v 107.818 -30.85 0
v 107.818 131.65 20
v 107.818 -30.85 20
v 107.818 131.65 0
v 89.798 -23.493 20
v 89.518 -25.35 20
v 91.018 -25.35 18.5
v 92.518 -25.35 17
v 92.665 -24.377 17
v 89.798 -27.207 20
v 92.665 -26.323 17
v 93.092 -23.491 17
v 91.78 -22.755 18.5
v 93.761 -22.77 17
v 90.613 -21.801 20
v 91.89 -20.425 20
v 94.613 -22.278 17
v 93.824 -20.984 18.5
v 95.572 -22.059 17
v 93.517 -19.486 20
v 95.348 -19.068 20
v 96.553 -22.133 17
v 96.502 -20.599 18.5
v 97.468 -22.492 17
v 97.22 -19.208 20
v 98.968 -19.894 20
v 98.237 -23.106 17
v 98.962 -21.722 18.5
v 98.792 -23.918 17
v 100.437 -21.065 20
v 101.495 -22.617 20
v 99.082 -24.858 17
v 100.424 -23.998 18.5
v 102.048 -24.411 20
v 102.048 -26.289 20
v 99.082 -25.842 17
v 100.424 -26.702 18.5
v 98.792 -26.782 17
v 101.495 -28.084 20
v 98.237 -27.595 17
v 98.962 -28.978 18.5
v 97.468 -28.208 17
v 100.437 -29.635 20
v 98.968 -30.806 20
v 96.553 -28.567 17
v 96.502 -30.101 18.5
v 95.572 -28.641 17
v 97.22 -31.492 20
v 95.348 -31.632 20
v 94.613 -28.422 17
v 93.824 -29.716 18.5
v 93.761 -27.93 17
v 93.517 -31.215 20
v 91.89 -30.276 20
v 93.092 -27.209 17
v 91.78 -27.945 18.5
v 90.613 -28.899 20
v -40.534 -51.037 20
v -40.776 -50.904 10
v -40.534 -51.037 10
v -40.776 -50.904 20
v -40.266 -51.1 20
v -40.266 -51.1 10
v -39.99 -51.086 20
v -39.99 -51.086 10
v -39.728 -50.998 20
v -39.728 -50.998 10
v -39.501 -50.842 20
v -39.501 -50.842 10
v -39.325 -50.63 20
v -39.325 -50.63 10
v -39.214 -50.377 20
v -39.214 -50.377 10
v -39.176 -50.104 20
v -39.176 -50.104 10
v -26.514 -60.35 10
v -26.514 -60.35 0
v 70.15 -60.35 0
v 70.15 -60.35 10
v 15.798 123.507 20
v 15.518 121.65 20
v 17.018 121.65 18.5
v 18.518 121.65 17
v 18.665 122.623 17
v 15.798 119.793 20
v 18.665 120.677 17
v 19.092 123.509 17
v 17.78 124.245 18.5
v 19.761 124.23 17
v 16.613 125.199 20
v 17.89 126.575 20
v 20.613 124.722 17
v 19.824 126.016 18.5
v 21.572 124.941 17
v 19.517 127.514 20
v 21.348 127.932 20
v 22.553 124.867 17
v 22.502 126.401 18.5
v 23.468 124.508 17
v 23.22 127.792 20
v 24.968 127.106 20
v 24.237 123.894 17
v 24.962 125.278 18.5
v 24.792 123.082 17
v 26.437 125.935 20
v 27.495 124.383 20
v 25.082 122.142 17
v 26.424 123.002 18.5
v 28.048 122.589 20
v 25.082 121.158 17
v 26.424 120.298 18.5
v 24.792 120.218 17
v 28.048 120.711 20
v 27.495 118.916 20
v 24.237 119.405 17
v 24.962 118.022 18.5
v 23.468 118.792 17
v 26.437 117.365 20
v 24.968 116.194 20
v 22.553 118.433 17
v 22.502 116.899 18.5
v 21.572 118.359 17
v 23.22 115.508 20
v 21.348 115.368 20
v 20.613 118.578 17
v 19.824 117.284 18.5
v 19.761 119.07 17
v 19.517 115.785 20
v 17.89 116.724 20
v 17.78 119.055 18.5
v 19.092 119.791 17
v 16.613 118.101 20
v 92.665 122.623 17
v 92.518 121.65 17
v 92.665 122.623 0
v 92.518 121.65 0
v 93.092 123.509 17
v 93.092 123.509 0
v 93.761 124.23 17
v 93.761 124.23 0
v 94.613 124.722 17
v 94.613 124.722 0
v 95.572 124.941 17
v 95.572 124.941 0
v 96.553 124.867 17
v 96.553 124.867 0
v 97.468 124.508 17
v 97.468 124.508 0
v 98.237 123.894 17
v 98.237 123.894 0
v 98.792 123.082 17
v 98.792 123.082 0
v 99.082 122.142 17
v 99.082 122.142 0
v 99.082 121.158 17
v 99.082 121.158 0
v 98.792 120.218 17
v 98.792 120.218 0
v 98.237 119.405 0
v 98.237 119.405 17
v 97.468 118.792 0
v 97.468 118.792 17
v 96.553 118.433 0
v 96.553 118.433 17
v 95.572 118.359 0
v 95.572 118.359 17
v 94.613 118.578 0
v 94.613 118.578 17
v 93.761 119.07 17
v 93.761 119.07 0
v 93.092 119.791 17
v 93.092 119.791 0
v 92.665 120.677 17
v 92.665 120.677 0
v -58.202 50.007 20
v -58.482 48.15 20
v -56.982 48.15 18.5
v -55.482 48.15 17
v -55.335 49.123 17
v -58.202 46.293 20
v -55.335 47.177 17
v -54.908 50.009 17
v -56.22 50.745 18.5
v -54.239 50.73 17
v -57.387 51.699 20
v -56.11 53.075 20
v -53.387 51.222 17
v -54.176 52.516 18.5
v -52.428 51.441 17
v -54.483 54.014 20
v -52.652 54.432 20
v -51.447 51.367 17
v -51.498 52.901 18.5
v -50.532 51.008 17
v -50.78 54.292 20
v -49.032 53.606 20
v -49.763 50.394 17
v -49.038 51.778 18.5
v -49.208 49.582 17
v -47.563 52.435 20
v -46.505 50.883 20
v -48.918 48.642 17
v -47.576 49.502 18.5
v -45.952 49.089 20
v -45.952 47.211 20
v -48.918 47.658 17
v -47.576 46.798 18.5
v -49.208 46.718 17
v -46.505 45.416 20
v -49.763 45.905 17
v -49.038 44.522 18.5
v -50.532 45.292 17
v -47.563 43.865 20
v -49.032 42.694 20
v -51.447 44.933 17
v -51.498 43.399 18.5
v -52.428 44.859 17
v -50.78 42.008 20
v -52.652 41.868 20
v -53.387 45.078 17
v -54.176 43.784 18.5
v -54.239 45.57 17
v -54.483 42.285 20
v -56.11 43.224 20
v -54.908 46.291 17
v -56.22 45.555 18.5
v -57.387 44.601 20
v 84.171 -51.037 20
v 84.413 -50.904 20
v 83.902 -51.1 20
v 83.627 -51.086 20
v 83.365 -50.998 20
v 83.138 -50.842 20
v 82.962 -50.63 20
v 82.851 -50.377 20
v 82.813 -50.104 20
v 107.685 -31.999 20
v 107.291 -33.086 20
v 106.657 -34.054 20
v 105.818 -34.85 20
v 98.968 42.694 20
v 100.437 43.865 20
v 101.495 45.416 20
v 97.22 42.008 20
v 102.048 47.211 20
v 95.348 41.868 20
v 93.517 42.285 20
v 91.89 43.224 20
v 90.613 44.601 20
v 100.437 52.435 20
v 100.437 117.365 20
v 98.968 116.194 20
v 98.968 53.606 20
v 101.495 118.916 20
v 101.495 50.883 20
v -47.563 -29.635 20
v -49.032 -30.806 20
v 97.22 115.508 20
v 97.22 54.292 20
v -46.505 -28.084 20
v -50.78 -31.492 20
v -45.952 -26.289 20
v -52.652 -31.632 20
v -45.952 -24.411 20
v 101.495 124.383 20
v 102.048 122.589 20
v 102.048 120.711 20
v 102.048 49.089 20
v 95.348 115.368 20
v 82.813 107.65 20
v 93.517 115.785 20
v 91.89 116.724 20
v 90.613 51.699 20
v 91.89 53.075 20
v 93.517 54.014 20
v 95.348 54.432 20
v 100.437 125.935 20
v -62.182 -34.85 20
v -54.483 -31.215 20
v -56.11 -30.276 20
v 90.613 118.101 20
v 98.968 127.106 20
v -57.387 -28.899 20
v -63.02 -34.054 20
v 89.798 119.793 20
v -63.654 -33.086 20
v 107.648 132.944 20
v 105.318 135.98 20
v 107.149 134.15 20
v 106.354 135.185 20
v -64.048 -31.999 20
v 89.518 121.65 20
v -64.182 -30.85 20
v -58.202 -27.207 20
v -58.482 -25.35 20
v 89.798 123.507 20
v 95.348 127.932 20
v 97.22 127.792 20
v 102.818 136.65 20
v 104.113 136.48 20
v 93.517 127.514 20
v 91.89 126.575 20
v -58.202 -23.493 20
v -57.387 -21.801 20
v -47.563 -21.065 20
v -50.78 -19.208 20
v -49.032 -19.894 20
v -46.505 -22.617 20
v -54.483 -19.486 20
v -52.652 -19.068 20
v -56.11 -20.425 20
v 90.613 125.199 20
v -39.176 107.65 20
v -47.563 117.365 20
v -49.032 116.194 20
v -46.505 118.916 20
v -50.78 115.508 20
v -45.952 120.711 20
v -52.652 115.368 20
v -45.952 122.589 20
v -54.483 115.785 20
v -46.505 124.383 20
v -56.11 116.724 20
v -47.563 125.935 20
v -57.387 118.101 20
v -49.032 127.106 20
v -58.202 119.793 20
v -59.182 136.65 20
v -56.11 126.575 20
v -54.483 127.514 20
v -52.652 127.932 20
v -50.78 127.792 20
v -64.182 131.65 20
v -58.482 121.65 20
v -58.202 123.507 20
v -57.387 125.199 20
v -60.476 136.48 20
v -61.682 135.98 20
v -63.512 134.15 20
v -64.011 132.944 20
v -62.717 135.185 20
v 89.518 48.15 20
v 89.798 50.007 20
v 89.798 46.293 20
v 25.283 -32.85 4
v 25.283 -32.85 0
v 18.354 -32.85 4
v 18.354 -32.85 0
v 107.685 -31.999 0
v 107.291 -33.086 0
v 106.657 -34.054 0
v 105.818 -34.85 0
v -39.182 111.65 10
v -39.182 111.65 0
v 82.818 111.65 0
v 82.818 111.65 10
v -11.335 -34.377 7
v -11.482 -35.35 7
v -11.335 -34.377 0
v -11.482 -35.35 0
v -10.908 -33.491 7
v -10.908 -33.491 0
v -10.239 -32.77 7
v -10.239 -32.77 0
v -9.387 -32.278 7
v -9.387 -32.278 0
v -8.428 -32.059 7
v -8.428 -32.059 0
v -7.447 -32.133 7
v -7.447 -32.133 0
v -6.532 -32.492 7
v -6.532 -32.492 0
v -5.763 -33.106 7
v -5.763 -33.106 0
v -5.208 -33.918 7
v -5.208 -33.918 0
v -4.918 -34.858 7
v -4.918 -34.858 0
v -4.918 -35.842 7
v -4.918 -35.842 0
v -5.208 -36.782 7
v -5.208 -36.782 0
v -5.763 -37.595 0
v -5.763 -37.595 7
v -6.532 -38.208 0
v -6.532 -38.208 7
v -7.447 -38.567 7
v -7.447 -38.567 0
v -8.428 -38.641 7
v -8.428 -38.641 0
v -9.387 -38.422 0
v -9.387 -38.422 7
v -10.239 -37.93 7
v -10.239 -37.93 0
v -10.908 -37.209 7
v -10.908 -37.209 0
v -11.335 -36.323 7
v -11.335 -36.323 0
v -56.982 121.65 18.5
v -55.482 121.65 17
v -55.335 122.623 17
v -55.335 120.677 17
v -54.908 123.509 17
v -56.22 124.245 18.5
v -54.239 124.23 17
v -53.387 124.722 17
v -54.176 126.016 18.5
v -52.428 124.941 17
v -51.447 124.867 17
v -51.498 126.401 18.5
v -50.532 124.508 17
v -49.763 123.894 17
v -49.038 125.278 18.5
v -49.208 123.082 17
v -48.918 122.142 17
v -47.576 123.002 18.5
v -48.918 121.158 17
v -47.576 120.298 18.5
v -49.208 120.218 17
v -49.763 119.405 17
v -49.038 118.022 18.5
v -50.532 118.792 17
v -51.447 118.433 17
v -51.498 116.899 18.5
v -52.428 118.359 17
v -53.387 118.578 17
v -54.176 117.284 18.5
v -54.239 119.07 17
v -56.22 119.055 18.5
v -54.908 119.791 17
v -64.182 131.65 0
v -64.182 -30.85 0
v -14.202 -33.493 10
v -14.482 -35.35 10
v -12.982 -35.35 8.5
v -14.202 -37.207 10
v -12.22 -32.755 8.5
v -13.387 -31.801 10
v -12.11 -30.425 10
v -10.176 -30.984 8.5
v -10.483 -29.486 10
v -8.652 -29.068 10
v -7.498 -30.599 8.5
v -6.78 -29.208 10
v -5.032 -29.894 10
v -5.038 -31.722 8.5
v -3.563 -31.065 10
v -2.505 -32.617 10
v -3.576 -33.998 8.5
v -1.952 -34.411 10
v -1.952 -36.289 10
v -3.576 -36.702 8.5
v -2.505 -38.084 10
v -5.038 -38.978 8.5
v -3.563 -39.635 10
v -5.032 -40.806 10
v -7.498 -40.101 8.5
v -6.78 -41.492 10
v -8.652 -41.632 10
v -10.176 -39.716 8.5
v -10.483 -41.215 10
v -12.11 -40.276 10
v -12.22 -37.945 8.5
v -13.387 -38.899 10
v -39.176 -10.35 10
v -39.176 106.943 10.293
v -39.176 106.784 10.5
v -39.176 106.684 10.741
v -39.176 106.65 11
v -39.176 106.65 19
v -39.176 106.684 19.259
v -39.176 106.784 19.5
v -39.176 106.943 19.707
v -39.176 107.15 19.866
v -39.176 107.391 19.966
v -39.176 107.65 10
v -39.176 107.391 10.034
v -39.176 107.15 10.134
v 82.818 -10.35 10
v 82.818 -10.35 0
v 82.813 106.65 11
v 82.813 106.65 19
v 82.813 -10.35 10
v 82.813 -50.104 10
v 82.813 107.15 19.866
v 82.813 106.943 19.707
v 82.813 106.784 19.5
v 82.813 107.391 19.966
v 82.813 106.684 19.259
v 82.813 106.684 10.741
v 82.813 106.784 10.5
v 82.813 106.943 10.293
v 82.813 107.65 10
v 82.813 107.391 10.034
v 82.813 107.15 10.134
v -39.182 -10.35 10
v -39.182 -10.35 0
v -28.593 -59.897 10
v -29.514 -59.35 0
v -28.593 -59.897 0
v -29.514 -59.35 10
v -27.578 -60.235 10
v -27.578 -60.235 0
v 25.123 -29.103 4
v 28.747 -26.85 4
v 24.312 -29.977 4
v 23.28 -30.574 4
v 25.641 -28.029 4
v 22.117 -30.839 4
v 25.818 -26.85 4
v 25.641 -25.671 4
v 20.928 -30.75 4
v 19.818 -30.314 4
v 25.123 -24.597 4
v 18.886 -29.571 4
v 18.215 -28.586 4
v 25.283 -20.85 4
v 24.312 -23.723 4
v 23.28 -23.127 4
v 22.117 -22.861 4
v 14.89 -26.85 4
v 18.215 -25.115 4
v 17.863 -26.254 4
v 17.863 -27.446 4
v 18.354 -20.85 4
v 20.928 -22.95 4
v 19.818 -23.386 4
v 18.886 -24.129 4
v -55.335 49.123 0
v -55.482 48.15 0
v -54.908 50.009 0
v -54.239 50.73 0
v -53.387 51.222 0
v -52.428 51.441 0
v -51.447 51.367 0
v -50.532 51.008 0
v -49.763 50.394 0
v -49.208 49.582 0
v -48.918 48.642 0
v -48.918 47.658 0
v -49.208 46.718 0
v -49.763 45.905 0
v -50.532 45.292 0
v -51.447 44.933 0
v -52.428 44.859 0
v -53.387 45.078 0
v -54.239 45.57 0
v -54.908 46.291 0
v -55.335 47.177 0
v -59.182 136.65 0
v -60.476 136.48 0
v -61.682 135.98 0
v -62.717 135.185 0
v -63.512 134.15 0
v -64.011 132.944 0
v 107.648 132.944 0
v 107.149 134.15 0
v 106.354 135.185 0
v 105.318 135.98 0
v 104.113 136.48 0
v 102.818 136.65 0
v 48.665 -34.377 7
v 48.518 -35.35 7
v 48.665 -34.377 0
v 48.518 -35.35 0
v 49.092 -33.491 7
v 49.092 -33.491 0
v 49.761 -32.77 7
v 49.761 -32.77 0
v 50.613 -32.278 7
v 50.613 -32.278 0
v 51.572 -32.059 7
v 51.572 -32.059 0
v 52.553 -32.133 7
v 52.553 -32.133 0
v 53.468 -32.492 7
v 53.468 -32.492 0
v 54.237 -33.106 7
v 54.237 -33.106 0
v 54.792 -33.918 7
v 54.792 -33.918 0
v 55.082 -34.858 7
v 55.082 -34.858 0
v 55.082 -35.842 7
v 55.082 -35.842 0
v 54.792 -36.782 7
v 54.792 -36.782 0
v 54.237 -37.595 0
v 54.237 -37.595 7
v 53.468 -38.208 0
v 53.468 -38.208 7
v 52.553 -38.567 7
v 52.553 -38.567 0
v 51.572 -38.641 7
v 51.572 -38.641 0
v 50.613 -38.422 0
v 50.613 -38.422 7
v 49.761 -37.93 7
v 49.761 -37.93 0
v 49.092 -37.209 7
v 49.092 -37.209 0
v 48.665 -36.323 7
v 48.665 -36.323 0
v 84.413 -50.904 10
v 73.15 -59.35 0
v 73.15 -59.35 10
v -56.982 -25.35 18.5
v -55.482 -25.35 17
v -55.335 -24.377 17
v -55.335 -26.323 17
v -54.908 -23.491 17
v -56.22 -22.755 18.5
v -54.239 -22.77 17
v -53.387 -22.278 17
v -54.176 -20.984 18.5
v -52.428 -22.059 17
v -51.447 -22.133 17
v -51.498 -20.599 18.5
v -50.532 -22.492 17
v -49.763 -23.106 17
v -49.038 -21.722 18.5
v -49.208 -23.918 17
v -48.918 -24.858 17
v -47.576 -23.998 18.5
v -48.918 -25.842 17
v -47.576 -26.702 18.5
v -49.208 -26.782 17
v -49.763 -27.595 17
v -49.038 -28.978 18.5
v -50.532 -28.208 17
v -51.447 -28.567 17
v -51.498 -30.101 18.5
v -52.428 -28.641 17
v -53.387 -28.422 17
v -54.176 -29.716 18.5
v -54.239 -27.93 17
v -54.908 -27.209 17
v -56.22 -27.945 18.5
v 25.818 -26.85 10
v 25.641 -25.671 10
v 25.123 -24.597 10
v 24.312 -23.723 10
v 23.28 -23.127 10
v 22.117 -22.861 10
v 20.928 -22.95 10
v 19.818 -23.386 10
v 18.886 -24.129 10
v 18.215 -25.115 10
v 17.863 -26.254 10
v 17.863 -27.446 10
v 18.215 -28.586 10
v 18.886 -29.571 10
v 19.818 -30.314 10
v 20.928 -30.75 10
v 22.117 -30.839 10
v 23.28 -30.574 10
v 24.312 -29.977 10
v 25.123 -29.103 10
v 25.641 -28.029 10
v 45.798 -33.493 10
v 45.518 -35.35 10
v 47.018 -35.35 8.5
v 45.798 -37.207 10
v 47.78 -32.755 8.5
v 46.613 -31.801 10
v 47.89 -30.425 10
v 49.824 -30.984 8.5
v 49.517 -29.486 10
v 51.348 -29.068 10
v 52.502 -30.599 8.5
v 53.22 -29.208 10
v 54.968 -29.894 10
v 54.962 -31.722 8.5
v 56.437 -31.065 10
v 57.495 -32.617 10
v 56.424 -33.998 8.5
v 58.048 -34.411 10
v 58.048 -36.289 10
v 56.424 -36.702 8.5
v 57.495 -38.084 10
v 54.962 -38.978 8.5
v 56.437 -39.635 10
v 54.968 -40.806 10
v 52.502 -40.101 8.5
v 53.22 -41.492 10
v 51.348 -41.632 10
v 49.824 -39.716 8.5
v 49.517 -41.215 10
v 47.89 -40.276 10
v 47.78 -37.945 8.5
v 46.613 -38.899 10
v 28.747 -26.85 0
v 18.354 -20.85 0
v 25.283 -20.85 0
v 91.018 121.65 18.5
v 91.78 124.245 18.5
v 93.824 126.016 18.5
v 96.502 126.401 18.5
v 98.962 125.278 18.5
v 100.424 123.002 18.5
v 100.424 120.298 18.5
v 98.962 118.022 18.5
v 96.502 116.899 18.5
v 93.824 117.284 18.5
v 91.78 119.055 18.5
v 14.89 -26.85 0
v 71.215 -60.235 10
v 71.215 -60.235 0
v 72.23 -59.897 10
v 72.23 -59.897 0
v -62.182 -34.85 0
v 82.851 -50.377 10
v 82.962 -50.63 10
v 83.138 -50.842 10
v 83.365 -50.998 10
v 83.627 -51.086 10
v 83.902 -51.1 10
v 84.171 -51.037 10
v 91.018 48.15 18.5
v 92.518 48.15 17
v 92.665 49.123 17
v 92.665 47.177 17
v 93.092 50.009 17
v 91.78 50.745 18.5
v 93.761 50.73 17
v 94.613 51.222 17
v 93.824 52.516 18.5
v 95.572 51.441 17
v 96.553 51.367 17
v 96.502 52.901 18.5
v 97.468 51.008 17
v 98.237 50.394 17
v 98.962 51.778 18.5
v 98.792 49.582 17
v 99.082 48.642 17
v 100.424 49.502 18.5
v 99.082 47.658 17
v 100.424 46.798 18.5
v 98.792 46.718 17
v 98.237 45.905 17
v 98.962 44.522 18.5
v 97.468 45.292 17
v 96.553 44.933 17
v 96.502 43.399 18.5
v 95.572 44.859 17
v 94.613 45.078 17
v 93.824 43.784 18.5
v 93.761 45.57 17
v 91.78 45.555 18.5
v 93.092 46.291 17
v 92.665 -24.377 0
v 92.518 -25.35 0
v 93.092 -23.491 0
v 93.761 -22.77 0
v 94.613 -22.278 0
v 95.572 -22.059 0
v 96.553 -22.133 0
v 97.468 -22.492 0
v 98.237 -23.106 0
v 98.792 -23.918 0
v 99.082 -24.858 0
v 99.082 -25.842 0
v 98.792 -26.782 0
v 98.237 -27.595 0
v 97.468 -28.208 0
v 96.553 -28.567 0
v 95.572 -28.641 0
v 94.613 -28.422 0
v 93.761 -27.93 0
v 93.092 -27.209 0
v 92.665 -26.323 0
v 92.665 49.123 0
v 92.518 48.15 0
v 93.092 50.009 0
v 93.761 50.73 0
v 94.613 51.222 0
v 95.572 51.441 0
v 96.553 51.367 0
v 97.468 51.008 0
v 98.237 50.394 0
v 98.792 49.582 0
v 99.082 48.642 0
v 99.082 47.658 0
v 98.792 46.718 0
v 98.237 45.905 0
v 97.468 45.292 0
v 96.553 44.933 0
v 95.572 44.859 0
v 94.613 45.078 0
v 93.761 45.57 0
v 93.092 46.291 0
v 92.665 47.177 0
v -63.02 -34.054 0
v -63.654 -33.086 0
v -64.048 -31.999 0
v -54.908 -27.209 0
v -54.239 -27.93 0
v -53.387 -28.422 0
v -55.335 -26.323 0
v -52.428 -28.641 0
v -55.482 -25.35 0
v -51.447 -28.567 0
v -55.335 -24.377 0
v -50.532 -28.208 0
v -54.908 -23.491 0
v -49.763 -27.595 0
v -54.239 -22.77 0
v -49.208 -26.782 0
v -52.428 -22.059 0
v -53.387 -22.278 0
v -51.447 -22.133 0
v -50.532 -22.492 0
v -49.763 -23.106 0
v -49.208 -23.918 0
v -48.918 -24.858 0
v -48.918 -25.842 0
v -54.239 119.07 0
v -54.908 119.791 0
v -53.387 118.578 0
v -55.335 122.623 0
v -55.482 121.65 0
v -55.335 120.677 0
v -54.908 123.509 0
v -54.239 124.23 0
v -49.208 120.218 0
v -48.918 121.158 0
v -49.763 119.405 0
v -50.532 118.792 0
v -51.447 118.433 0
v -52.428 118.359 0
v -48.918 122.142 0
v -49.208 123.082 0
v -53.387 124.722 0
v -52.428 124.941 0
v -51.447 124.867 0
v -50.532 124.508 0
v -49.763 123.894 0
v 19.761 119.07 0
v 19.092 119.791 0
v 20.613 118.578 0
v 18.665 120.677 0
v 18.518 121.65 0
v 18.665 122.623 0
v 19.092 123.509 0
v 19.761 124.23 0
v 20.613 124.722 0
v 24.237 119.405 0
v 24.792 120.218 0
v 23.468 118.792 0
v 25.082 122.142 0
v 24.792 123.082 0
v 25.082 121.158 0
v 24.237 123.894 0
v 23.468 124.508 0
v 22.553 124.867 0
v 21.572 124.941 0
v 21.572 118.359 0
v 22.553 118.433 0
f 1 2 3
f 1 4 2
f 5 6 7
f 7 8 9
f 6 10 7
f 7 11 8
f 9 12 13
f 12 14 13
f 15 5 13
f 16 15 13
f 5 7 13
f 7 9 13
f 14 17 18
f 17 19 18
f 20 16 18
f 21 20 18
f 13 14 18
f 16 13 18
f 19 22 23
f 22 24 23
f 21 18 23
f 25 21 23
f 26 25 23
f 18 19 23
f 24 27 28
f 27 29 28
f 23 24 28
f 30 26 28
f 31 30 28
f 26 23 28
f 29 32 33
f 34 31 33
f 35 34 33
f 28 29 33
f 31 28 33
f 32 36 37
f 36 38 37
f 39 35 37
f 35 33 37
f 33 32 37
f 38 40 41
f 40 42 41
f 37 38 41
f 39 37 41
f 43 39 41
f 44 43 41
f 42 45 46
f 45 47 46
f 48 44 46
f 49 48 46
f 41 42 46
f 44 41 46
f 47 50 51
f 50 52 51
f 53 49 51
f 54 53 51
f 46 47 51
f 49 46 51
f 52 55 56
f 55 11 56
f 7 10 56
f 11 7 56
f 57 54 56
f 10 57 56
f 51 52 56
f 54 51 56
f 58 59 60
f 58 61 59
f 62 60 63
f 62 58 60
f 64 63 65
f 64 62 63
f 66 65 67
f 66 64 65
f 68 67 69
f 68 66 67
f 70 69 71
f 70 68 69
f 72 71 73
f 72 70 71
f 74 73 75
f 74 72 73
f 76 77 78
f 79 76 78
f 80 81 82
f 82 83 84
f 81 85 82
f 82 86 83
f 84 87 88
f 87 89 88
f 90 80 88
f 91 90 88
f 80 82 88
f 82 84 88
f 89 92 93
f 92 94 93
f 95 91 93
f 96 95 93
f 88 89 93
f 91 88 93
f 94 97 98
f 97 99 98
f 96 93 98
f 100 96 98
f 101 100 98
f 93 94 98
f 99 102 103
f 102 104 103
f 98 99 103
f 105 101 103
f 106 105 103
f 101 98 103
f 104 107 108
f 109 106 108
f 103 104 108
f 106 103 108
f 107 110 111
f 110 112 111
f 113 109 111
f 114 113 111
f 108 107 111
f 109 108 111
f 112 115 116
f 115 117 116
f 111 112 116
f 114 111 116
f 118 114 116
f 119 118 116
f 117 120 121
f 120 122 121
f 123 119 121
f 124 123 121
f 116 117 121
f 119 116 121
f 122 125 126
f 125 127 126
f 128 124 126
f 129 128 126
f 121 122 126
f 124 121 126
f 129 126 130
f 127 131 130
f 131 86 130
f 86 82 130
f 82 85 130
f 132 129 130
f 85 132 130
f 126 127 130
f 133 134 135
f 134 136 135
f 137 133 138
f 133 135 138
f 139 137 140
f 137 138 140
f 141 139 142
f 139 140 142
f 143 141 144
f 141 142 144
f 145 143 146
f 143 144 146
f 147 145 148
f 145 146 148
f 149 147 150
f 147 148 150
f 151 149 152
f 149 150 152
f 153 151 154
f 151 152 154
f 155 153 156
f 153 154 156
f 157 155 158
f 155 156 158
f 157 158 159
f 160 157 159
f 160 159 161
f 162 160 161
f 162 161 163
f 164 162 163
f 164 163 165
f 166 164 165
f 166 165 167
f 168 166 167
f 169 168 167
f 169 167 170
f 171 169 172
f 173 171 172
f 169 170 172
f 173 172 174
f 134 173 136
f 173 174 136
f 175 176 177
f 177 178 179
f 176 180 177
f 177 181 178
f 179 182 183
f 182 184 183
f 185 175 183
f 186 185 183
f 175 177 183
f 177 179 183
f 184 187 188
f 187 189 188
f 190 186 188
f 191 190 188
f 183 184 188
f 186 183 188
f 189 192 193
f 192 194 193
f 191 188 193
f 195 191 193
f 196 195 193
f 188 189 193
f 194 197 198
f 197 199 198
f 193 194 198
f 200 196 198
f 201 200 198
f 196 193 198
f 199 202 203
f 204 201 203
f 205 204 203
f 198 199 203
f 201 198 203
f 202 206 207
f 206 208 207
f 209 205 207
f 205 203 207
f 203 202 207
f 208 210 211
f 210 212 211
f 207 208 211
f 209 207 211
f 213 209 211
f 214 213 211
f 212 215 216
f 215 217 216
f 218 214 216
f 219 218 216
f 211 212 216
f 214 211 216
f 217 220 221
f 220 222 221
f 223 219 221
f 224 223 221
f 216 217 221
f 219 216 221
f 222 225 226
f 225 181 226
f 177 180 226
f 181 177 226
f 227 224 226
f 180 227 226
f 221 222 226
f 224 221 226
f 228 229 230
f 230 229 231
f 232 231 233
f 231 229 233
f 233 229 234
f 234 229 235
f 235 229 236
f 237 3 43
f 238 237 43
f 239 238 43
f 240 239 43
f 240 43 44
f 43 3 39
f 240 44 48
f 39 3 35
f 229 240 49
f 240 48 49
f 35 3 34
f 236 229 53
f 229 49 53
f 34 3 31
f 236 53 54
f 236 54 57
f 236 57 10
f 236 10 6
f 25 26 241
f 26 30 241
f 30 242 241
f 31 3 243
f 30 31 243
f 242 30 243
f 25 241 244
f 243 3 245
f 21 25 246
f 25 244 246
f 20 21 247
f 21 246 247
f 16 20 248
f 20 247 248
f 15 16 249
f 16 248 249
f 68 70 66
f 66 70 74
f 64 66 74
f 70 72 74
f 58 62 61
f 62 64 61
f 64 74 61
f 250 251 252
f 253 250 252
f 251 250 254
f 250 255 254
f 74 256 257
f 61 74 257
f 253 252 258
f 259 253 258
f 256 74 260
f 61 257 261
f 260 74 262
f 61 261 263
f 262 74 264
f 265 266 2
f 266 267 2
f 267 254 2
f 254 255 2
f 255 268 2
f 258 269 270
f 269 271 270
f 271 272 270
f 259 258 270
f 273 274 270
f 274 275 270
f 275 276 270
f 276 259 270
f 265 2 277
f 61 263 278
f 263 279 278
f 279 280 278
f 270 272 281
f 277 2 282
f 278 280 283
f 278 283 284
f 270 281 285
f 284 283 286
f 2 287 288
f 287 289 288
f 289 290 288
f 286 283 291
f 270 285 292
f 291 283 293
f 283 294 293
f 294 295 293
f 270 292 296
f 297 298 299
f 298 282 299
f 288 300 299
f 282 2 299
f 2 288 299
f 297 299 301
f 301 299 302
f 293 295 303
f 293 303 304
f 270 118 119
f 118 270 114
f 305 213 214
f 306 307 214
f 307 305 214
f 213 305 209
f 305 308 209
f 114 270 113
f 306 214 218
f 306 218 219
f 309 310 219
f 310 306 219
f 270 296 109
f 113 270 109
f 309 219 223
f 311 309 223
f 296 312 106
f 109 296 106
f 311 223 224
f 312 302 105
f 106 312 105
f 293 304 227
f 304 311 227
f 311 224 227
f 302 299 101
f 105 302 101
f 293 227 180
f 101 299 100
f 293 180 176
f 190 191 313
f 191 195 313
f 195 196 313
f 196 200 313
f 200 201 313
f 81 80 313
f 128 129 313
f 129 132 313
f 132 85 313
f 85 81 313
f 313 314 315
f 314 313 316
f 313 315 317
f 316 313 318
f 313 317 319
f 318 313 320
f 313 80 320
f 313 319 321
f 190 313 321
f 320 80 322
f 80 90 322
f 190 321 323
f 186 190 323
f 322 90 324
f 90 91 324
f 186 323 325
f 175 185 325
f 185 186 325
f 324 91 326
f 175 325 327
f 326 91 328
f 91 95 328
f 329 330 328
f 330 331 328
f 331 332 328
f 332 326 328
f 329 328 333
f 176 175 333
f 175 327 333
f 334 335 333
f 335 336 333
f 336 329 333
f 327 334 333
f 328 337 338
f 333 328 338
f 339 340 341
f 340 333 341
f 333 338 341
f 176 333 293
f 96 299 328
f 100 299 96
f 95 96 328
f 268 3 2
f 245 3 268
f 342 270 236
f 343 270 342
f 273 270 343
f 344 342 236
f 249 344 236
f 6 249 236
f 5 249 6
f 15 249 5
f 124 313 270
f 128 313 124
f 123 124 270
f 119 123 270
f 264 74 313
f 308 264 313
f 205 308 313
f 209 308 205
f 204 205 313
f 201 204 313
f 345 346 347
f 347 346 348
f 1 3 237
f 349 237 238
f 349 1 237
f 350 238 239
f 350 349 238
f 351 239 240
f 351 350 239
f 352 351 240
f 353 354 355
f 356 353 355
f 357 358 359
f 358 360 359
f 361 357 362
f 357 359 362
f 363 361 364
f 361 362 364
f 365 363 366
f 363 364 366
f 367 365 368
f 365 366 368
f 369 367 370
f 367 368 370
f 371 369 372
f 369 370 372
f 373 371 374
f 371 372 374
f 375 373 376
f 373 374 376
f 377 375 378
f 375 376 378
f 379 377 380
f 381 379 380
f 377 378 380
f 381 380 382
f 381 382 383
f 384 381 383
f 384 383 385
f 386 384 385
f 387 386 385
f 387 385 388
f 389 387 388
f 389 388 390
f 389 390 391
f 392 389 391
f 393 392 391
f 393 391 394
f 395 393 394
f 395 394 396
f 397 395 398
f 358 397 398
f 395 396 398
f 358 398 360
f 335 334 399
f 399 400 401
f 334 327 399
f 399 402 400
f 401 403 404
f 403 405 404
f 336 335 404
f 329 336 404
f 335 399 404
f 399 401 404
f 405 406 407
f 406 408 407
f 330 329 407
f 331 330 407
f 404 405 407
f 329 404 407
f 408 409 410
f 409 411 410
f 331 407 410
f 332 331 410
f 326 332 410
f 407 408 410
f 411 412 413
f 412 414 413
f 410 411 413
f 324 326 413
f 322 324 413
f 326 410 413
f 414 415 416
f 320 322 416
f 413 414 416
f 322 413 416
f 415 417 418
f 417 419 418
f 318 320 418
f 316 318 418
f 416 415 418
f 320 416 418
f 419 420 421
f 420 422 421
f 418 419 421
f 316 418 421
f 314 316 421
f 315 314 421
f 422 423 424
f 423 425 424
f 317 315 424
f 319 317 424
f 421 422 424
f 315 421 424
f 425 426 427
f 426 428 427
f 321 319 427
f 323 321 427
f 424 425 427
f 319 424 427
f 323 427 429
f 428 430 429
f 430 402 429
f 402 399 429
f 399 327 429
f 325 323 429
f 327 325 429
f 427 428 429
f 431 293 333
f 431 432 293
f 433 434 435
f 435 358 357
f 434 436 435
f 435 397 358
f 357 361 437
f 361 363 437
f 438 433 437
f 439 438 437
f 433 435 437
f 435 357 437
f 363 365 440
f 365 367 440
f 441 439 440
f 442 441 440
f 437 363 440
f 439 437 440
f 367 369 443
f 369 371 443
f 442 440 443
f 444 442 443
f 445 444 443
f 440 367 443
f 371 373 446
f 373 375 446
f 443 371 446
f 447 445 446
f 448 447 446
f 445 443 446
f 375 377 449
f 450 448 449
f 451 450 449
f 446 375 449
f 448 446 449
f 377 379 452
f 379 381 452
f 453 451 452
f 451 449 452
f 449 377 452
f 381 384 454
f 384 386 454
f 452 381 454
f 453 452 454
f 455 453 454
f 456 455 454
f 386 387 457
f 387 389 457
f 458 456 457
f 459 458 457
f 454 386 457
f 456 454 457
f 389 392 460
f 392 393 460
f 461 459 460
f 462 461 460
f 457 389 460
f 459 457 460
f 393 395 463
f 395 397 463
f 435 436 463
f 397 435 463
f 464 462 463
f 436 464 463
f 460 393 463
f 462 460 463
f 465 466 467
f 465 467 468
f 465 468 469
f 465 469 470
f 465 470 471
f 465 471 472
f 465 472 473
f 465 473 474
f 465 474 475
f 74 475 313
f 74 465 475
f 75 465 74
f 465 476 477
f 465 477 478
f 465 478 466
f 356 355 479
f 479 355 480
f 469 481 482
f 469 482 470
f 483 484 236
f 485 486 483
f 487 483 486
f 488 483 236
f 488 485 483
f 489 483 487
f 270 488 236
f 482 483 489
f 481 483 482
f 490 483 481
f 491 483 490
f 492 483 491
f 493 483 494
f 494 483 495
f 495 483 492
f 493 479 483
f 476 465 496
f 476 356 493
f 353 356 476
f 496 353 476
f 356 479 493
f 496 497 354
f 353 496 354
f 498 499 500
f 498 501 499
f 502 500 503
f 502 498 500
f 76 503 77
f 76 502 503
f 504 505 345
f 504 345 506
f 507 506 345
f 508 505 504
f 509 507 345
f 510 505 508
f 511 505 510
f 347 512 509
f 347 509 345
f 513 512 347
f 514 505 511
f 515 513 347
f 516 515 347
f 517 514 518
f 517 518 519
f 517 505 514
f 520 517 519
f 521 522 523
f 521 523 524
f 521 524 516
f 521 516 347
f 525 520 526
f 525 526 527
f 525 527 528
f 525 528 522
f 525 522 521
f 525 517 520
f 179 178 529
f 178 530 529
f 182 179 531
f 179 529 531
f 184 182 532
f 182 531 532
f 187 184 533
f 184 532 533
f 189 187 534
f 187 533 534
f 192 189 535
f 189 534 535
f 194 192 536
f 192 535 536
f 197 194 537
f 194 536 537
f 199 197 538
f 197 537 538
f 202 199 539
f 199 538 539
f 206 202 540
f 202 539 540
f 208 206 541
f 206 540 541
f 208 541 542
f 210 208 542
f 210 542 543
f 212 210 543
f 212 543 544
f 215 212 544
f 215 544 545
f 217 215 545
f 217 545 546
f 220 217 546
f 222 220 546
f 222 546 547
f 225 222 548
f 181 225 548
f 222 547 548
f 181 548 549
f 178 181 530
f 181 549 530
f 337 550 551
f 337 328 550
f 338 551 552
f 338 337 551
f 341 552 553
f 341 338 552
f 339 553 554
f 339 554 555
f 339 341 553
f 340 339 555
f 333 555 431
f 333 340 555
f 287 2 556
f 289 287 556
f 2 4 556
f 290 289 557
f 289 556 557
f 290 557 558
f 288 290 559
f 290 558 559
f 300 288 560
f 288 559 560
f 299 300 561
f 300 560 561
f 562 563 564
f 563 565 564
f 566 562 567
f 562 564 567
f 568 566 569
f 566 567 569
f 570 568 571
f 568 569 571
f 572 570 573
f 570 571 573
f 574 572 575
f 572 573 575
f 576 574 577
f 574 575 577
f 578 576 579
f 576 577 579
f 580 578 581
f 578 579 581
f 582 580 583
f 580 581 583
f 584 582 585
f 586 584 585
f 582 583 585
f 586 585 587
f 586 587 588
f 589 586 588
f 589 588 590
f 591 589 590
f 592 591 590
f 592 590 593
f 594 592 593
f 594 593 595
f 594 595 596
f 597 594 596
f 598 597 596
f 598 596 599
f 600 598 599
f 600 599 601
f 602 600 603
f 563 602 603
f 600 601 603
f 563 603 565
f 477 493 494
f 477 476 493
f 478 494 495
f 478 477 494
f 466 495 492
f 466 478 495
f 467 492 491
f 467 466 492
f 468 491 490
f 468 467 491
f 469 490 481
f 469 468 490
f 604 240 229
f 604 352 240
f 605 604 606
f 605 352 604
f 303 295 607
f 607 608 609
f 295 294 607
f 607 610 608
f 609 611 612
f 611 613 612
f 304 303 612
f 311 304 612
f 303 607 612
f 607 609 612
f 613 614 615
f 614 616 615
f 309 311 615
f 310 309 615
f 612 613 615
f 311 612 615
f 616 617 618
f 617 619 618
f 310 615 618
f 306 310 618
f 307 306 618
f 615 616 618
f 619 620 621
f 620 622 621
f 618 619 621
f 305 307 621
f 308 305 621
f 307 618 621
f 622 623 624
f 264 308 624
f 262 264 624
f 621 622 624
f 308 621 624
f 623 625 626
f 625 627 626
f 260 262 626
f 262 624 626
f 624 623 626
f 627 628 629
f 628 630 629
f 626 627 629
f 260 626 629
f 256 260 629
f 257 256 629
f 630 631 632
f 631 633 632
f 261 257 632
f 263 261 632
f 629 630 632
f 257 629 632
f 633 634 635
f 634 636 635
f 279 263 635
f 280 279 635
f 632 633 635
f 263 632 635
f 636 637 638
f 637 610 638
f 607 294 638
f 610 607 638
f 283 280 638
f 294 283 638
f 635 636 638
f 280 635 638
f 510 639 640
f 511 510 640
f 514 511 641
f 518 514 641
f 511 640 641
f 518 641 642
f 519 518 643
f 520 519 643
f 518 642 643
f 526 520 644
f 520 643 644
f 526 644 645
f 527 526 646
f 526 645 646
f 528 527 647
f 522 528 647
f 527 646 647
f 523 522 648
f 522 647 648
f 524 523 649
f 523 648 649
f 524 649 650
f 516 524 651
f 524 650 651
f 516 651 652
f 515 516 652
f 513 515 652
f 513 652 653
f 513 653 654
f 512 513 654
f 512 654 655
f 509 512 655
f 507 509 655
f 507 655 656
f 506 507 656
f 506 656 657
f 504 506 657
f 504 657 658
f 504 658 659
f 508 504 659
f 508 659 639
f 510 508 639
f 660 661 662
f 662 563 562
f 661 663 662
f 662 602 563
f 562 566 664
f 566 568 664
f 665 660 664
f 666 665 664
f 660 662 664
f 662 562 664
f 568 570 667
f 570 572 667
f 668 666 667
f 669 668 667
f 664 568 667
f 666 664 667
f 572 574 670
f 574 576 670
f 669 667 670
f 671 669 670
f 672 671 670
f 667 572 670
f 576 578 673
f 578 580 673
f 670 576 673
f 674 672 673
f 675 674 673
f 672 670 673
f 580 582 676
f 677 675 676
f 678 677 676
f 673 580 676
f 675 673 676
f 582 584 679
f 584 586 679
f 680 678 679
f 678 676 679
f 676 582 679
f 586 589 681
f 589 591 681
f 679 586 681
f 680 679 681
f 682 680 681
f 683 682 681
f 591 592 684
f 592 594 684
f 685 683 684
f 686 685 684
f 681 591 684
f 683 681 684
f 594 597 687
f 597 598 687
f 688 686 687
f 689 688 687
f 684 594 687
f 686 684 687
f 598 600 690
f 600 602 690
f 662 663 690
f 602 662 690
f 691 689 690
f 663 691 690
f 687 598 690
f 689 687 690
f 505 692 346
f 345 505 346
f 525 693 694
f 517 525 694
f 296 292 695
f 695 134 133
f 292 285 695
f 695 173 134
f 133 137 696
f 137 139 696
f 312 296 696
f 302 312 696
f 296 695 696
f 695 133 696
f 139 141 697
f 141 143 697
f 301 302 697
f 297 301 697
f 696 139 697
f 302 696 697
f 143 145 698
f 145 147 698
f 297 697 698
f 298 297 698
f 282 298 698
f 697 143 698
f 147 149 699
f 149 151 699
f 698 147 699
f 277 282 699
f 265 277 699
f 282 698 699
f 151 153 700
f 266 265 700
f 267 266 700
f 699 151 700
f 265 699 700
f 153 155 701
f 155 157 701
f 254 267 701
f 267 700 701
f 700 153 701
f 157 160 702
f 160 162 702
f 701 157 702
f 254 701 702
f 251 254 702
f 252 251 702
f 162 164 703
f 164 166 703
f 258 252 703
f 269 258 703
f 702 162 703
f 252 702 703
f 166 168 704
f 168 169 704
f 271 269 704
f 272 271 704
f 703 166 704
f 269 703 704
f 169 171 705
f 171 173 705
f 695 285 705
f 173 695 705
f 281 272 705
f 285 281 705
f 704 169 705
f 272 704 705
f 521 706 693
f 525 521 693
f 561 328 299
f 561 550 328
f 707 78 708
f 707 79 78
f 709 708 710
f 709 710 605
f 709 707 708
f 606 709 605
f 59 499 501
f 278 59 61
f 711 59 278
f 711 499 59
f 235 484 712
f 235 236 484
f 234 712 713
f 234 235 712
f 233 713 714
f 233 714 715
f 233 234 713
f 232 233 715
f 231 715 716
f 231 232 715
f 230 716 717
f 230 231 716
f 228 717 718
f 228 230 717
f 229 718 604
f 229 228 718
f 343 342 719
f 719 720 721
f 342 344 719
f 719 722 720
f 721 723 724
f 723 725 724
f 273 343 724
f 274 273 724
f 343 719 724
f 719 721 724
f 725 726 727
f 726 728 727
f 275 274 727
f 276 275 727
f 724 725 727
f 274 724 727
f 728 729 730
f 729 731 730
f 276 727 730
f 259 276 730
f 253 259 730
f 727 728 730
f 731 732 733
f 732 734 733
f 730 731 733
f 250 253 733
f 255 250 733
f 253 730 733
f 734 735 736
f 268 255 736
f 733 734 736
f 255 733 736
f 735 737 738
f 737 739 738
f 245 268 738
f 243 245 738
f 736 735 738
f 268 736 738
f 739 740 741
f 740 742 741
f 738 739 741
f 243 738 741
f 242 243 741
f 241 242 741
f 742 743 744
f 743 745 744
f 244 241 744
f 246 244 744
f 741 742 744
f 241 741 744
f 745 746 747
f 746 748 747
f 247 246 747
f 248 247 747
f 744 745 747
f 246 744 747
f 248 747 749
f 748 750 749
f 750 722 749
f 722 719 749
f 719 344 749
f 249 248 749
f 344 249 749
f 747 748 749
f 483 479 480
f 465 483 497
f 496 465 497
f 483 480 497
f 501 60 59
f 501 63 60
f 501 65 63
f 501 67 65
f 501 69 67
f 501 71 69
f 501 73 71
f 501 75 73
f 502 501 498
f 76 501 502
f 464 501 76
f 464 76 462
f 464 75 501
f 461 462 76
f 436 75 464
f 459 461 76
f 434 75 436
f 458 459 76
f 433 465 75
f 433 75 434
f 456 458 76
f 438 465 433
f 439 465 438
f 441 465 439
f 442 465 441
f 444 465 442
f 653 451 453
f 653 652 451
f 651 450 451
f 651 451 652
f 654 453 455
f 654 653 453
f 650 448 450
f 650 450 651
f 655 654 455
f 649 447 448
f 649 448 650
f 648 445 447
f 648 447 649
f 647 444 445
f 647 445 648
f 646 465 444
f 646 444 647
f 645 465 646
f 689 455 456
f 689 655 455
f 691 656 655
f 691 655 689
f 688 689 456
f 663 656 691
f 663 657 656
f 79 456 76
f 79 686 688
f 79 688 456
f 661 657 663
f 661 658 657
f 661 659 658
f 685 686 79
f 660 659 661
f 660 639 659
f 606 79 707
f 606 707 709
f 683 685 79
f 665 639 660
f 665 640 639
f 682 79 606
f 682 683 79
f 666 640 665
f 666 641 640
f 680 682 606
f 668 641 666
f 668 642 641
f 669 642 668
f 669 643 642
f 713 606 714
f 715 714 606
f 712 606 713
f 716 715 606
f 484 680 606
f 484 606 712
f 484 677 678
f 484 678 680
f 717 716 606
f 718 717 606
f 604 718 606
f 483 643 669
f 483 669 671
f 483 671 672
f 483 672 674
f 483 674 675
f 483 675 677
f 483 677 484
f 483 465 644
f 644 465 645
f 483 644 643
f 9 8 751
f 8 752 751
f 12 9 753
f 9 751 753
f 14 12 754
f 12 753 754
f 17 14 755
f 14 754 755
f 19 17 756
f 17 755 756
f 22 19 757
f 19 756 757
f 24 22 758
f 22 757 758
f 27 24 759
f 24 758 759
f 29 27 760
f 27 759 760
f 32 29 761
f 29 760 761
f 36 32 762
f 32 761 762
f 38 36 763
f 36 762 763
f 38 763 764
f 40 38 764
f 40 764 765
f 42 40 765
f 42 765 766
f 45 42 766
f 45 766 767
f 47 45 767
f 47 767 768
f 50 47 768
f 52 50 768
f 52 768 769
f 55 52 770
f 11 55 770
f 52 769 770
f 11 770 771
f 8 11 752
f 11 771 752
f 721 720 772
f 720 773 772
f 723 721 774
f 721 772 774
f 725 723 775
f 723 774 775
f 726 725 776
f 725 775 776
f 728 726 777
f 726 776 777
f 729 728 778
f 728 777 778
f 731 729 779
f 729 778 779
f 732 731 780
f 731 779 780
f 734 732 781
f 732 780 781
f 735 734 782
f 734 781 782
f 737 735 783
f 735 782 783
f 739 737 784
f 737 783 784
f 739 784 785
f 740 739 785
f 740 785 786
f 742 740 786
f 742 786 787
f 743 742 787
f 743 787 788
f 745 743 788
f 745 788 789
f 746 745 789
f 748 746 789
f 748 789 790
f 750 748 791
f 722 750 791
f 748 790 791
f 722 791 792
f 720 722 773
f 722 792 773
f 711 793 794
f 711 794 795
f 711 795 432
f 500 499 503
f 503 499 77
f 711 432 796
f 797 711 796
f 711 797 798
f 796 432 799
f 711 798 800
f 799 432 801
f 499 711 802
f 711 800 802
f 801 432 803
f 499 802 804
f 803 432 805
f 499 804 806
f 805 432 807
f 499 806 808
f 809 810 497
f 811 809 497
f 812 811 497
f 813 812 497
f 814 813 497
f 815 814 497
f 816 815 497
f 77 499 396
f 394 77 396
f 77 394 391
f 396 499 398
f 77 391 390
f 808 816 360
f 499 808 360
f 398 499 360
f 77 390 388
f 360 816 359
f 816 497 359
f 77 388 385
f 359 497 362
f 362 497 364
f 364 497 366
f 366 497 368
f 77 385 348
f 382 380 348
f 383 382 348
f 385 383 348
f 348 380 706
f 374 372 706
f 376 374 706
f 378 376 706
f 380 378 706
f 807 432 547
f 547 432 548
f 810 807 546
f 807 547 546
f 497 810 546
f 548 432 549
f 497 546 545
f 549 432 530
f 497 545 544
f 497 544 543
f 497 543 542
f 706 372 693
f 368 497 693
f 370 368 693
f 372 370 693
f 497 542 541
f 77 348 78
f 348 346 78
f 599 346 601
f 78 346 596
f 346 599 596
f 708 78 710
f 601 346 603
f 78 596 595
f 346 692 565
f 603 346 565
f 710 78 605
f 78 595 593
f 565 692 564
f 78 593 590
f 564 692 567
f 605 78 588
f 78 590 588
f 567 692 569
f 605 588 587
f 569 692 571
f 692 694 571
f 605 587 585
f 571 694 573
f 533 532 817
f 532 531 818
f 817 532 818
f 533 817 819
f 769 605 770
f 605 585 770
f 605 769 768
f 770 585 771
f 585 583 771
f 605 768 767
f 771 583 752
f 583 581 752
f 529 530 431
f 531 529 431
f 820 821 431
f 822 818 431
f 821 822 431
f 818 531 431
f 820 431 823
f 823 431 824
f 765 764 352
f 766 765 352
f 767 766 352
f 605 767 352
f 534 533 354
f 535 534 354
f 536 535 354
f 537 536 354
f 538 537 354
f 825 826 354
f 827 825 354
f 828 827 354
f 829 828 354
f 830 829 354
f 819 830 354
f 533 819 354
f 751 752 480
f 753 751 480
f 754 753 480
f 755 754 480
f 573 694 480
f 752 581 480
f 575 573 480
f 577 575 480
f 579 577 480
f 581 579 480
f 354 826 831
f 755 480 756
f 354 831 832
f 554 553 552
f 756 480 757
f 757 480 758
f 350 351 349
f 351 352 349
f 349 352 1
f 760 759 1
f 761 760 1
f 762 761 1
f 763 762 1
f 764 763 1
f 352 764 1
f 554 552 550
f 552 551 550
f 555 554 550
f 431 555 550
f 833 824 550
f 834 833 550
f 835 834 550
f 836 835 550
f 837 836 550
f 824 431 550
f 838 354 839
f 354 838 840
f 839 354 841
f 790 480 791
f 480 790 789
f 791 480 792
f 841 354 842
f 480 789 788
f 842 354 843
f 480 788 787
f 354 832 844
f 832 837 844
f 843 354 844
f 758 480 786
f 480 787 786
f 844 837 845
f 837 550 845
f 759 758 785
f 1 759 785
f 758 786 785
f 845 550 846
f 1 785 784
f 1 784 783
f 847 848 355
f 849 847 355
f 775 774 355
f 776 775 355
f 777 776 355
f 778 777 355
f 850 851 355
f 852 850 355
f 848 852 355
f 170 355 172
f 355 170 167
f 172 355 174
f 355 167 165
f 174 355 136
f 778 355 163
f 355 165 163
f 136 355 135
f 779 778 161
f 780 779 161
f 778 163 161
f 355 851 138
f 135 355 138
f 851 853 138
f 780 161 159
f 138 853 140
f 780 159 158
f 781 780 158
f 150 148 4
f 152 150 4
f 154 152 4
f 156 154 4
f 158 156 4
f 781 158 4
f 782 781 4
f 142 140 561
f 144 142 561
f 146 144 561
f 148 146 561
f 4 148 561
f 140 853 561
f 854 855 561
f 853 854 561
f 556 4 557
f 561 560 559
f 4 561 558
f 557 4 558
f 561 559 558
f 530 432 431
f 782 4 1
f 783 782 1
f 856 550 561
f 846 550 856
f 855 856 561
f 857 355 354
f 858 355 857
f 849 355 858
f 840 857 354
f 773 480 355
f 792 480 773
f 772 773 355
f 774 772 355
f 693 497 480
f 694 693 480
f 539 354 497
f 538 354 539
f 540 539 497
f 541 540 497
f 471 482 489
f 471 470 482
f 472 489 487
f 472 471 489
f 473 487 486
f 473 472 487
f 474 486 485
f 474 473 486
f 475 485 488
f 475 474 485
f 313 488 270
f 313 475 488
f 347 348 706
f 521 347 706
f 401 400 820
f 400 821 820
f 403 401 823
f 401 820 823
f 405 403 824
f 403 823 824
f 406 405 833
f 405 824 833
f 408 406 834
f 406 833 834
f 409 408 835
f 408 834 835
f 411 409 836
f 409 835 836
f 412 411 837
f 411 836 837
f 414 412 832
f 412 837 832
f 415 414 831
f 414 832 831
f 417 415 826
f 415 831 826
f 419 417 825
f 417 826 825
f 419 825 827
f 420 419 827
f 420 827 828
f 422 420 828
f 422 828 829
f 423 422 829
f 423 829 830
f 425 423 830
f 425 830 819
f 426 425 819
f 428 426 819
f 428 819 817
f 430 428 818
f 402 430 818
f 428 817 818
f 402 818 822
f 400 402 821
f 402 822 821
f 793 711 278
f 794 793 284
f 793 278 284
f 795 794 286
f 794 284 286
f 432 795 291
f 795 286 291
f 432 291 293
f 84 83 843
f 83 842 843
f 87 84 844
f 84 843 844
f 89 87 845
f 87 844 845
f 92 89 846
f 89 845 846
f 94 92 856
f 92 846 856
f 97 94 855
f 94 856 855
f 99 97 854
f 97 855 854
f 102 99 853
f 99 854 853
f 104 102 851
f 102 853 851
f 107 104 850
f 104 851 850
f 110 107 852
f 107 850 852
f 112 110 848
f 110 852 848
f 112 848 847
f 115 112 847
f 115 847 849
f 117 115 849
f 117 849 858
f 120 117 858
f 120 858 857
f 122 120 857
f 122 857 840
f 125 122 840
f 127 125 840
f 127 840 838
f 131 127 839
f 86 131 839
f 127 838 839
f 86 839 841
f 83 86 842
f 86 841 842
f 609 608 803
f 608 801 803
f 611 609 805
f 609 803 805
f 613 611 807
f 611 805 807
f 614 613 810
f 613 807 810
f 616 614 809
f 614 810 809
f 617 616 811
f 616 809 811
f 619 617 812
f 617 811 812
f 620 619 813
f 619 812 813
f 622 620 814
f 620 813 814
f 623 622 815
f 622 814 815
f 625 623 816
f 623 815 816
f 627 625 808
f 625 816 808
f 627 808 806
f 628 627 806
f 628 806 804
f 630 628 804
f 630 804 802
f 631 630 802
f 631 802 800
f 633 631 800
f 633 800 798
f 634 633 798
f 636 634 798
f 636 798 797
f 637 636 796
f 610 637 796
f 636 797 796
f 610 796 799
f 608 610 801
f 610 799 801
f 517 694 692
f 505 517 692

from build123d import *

# Parameters (mm, degrees)
BOSS_EXTRUDE1_DEPTH                                 = 10
BOSS_EXTRUDE2_DEPTH                                 = 10
FILLET1_R                                           = 1
FILLET2_R                                           = 4.999999999999999
FILLET3_R                                           = 1
SKETCH4_R                                           = 3.0000000000000018
SKETCH4_R_2                                         = 3.0000000000000027
SKETCH4_R_3                                         = 2.9999999999999862
SKETCH4_R_4                                         = 3.0000000000000266
SKETCH4_R_5                                         = 2.9999999999999947
SKETCH4_R_6                                         = 3.0000000000000044
SKETCH4_R_7                                         = 3.999999999999999
CUT_EXTRUDE1_DEPTH                                  = 20
CSK_FOR_M6_COUNTERSUNK_FLAT_HEAD_SCREW1_D           = 6.6
CSK_FOR_M6_COUNTERSUNK_FLAT_HEAD_SCREW1_CSINK_D     = 12.6
CSK_FOR_M6_COUNTERSUNK_FLAT_HEAD_SCREW1_CSINK_ANGLE = 90
CSK_FOR_M6_COUNTERSUNK_FLAT_HEAD_SCR_2_D            = 6.6
CSK_FOR_M6_COUNTERSUNK_FLAT_HEAD_SCR_2_CSINK_D      = 12.6
CSK_FOR_M6_COUNTERSUNK_FLAT_HEAD_SCR_2_CSINK_ANGLE  = 90
CUT_EXTRUDE2_DEPTH                                  = 4


with BuildPart() as part:
    # Sketch1 → Boss-Extrude1 (new body)
    with BuildSketch(Plane.XY):
        Polygon((-64.18159055149353, 136.6499257706783), (-64.18159055149351, -33.350074229321706), (-28.18019077559496, -60.35007422932169), (71.81700967260791, -60.35007422932168), (107.81840944850644, -33.350074229321706), (107.81840944850646, 136.64992577067832), align=None)
        Polygon((82.81840944850644, 111.64992577067832), (82.81840944850646, -10.350074229321688), (-39.18159055149353, -10.350074229321688), (-39.181590551493535, 111.64992577067831), align=None, mode=Mode.SUBTRACT)
    extrude(amount=BOSS_EXTRUDE1_DEPTH)

    # Sketch2 → Boss-Extrude2 (add)
    with BuildSketch(Plane.XY.offset(10)):
        Polygon((-64.18159055149353, 136.6499257706783), (107.81840944850646, 136.6499257706783), (107.8184094485065, -33.350074229321685), (82.81253069213544, -52.103754103569464), (82.81253069213545, 106.64992577067831), (-39.17571179512253, 106.64992577067831), (-39.17571179512251, -52.103754103569464), (-64.18159055149351, -33.350074229321706), align=None)
    extrude(amount=BOSS_EXTRUDE2_DEPTH)

    # Fillet1
    fillet1_edges = [part.edges().sort_by_distance(p)[0] for p in [
        (21.818409448506458, 106.64992577067831, 10),
        (21.818409448506458, 106.64992577067831, 20),
    ]]
    fillet(fillet1_edges, radius=FILLET1_R)

    # Fillet2
    fillet2_edges = [part.edges().sort_by_distance(p)[0] for p in [
        (-28.18019077559496, -60.35007422932169, 5),
        (-64.18159055149351, -33.350074229321706, 10),
        (-64.18159055149353, 136.6499257706783, 10),
        (71.81700967260791, -60.35007422932168, 5),
        (107.81840944850647, -33.35007422932169, 10),
        (107.81840944850646, 136.6499257706783, 10),
    ]]
    fillet(fillet2_edges, radius=FILLET2_R)

    # Fillet3
    fillet3_edges = [part.edges().sort_by_distance(p)[0] for p in [
        (82.81253069213544, -52.103754103569464, 15),
        (-39.17571179512251, -52.103754103569464, 15),
    ]]
    fillet(fillet3_edges, radius=FILLET3_R)

    # Sketch4 → Cut-Extrude1 (cut)
    with BuildSketch(Plane.XY.offset(20)):
        with Locations((-52.18159055149353, 121.64992577067831)):
            Circle(SKETCH4_R)
        with Locations((-52.18159055149302, -25.350074229321695)):
            Circle(SKETCH4_R)
        with Locations((-52.181590551493514, 48.14992577067831)):
            Circle(SKETCH4_R)
        with Locations((-8.181590551493347, -35.350074229321685)):
            Circle(SKETCH4_R_2)
        with Locations((51.81840944850665, -35.35007422932168)):
            Circle(SKETCH4_R_3)
        with Locations((95.81840944850728, 48.149925770678834)):
            Circle(SKETCH4_R_4)
        with Locations((95.81840944850728, -25.350074229321194)):
            Circle(SKETCH4_R_5)
        with Locations((95.81840944850677, 121.64992577067882)):
            Circle(SKETCH4_R_6)
        with Locations((21.818409448506646, -26.850074229321688)):
            Circle(SKETCH4_R_7)
        with Locations((21.818409448506618, 121.64992577067856)):
            Circle(SKETCH4_R)
    extrude(amount=-CUT_EXTRUDE1_DEPTH, mode=Mode.SUBTRACT)

    # CSK for M6 Countersunk Flat Head Screw1 (through all)
    with Locations(Plane(origin=(-52.181590551, 121.649925771, 20), x_dir=(1, 0, 0), z_dir=(0, 0, 1))):
        with Locations((0, 0), (0, -73.5), (0, -147), (148, -147), (148, -73.5), (148, 0), (74, 0)):
            CounterSinkHole(CSK_FOR_M6_COUNTERSUNK_FLAT_HEAD_SCREW1_D / 2, CSK_FOR_M6_COUNTERSUNK_FLAT_HEAD_SCREW1_CSINK_D / 2, counter_sink_angle=CSK_FOR_M6_COUNTERSUNK_FLAT_HEAD_SCREW1_CSINK_ANGLE)

    # CSK for M6 Countersunk Flat Head Scr 2 (through all)
    with Locations(Plane(origin=(-8.181590551, -35.350074229, 10), x_dir=(1, 0, 0), z_dir=(0, 0, 1))):
        with Locations((0, 0), (60, 0)):
            CounterSinkHole(CSK_FOR_M6_COUNTERSUNK_FLAT_HEAD_SCR_2_D / 2, CSK_FOR_M6_COUNTERSUNK_FLAT_HEAD_SCR_2_CSINK_D / 2, counter_sink_angle=CSK_FOR_M6_COUNTERSUNK_FLAT_HEAD_SCR_2_CSINK_ANGLE)

    # Sketch6 → Cut-Extrude2 (cut)
    with BuildSketch(Plane(origin=(0, 0, 0), x_dir=(-1, 0, 0), z_dir=(0, 0, -1))):
        Polygon((-14.890206218231118, -26.850074229321667), (-18.354307833368882, -20.850074229321656), (-25.282511063644392, -20.850074229321656), (-28.74661267878215, -26.850074229321656), (-25.282511063644392, -32.850074229321656), (-18.354307833368868, -32.850074229321656), align=None)
    extrude(amount=-CUT_EXTRUDE2_DEPTH, mode=Mode.SUBTRACT)


solid = part.part
